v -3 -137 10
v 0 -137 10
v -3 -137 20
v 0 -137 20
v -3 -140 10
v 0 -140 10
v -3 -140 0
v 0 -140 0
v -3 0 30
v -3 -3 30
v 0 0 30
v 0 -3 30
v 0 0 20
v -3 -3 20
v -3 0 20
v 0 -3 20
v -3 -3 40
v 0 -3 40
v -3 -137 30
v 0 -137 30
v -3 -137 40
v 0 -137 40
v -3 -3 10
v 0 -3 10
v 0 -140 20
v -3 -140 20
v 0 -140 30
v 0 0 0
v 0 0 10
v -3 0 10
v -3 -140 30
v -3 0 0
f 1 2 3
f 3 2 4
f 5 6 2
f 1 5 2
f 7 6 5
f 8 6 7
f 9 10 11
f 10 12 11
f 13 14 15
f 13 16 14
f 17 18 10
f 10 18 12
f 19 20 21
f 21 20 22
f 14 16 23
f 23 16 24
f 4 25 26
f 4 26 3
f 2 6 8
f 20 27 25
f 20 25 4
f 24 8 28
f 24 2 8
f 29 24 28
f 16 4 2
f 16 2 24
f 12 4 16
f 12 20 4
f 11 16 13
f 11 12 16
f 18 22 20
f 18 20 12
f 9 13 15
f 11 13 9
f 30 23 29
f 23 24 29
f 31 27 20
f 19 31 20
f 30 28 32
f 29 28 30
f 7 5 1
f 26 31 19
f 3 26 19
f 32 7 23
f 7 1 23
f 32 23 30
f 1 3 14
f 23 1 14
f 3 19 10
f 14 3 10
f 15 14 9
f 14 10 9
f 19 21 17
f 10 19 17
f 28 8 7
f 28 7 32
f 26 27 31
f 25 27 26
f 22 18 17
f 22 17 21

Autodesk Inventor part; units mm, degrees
ref_plane "YZ Plane" through (0, 0, 0) normal (1, 0, 0) x (0, 1, 0)
ref_plane "XZ Plane" through (0, 0, 0) normal (0, 1, 0) x (-1, 0, 0)
ref_plane "XY Plane" through (0, 0, 0) normal (0, 0, 1) x (1, 0, 0)
sketch "Sketch1" plane through (0, 0, 0) normal (1, 0, 0) x (0, 1, 0)
  line L0 (0, 0) -> (0, 10)
  line L1 (0, 10) -> (0, 20)
  line L2 (0, 20) -> (0, 30)
  line L3 (0, 30) -> (0, 40)
  line L4 (0, 40) -> (-70, 40)
  line L5 (-70, 40) -> (-70, 0)
  line L6 (-70, 0) -> (0, 0)
  line L7 (0, 0) -> (0, 40)
  line L8 (0, 40) -> (-3, 40)
  line L9 (-3, 40) -> (-3, 30)
  line L10 (-3, 30) -> (-3, 20)
  line L11 (-3, 20) -> (-3, 10)
  line L12 (-3, 10) -> (-3, 0)
  line L13 (-3, 30) -> (0, 30)
  line L14 (-3, 20) -> (0, 20)
  line L15 (-3, 10) -> (0, 10)
  dimension "d0" = 10
  dimension "d1" = 10
  dimension "d2" = 10
  dimension "d3" = 10
  dimension "d4" = 70
  dimension "d5" = 40
  dimension "d6" = 3
  dimension "d7" = 10
  dimension "d8" = 10
  dimension "d9" = 10
  dimension "d10" = 10
extrude "Extrusion1" add sketch "Sketch1" against normal blind 3 contours L6 L12 L15 L0 | L6 L5 L4 L9 L10 L11 L12 | L14 L10 L13 L2
mirror "Mirror1" about plane through (0, -70, 0) normal (0, -1, 0) of "Extrusion1"
properties part number "voorruit"
